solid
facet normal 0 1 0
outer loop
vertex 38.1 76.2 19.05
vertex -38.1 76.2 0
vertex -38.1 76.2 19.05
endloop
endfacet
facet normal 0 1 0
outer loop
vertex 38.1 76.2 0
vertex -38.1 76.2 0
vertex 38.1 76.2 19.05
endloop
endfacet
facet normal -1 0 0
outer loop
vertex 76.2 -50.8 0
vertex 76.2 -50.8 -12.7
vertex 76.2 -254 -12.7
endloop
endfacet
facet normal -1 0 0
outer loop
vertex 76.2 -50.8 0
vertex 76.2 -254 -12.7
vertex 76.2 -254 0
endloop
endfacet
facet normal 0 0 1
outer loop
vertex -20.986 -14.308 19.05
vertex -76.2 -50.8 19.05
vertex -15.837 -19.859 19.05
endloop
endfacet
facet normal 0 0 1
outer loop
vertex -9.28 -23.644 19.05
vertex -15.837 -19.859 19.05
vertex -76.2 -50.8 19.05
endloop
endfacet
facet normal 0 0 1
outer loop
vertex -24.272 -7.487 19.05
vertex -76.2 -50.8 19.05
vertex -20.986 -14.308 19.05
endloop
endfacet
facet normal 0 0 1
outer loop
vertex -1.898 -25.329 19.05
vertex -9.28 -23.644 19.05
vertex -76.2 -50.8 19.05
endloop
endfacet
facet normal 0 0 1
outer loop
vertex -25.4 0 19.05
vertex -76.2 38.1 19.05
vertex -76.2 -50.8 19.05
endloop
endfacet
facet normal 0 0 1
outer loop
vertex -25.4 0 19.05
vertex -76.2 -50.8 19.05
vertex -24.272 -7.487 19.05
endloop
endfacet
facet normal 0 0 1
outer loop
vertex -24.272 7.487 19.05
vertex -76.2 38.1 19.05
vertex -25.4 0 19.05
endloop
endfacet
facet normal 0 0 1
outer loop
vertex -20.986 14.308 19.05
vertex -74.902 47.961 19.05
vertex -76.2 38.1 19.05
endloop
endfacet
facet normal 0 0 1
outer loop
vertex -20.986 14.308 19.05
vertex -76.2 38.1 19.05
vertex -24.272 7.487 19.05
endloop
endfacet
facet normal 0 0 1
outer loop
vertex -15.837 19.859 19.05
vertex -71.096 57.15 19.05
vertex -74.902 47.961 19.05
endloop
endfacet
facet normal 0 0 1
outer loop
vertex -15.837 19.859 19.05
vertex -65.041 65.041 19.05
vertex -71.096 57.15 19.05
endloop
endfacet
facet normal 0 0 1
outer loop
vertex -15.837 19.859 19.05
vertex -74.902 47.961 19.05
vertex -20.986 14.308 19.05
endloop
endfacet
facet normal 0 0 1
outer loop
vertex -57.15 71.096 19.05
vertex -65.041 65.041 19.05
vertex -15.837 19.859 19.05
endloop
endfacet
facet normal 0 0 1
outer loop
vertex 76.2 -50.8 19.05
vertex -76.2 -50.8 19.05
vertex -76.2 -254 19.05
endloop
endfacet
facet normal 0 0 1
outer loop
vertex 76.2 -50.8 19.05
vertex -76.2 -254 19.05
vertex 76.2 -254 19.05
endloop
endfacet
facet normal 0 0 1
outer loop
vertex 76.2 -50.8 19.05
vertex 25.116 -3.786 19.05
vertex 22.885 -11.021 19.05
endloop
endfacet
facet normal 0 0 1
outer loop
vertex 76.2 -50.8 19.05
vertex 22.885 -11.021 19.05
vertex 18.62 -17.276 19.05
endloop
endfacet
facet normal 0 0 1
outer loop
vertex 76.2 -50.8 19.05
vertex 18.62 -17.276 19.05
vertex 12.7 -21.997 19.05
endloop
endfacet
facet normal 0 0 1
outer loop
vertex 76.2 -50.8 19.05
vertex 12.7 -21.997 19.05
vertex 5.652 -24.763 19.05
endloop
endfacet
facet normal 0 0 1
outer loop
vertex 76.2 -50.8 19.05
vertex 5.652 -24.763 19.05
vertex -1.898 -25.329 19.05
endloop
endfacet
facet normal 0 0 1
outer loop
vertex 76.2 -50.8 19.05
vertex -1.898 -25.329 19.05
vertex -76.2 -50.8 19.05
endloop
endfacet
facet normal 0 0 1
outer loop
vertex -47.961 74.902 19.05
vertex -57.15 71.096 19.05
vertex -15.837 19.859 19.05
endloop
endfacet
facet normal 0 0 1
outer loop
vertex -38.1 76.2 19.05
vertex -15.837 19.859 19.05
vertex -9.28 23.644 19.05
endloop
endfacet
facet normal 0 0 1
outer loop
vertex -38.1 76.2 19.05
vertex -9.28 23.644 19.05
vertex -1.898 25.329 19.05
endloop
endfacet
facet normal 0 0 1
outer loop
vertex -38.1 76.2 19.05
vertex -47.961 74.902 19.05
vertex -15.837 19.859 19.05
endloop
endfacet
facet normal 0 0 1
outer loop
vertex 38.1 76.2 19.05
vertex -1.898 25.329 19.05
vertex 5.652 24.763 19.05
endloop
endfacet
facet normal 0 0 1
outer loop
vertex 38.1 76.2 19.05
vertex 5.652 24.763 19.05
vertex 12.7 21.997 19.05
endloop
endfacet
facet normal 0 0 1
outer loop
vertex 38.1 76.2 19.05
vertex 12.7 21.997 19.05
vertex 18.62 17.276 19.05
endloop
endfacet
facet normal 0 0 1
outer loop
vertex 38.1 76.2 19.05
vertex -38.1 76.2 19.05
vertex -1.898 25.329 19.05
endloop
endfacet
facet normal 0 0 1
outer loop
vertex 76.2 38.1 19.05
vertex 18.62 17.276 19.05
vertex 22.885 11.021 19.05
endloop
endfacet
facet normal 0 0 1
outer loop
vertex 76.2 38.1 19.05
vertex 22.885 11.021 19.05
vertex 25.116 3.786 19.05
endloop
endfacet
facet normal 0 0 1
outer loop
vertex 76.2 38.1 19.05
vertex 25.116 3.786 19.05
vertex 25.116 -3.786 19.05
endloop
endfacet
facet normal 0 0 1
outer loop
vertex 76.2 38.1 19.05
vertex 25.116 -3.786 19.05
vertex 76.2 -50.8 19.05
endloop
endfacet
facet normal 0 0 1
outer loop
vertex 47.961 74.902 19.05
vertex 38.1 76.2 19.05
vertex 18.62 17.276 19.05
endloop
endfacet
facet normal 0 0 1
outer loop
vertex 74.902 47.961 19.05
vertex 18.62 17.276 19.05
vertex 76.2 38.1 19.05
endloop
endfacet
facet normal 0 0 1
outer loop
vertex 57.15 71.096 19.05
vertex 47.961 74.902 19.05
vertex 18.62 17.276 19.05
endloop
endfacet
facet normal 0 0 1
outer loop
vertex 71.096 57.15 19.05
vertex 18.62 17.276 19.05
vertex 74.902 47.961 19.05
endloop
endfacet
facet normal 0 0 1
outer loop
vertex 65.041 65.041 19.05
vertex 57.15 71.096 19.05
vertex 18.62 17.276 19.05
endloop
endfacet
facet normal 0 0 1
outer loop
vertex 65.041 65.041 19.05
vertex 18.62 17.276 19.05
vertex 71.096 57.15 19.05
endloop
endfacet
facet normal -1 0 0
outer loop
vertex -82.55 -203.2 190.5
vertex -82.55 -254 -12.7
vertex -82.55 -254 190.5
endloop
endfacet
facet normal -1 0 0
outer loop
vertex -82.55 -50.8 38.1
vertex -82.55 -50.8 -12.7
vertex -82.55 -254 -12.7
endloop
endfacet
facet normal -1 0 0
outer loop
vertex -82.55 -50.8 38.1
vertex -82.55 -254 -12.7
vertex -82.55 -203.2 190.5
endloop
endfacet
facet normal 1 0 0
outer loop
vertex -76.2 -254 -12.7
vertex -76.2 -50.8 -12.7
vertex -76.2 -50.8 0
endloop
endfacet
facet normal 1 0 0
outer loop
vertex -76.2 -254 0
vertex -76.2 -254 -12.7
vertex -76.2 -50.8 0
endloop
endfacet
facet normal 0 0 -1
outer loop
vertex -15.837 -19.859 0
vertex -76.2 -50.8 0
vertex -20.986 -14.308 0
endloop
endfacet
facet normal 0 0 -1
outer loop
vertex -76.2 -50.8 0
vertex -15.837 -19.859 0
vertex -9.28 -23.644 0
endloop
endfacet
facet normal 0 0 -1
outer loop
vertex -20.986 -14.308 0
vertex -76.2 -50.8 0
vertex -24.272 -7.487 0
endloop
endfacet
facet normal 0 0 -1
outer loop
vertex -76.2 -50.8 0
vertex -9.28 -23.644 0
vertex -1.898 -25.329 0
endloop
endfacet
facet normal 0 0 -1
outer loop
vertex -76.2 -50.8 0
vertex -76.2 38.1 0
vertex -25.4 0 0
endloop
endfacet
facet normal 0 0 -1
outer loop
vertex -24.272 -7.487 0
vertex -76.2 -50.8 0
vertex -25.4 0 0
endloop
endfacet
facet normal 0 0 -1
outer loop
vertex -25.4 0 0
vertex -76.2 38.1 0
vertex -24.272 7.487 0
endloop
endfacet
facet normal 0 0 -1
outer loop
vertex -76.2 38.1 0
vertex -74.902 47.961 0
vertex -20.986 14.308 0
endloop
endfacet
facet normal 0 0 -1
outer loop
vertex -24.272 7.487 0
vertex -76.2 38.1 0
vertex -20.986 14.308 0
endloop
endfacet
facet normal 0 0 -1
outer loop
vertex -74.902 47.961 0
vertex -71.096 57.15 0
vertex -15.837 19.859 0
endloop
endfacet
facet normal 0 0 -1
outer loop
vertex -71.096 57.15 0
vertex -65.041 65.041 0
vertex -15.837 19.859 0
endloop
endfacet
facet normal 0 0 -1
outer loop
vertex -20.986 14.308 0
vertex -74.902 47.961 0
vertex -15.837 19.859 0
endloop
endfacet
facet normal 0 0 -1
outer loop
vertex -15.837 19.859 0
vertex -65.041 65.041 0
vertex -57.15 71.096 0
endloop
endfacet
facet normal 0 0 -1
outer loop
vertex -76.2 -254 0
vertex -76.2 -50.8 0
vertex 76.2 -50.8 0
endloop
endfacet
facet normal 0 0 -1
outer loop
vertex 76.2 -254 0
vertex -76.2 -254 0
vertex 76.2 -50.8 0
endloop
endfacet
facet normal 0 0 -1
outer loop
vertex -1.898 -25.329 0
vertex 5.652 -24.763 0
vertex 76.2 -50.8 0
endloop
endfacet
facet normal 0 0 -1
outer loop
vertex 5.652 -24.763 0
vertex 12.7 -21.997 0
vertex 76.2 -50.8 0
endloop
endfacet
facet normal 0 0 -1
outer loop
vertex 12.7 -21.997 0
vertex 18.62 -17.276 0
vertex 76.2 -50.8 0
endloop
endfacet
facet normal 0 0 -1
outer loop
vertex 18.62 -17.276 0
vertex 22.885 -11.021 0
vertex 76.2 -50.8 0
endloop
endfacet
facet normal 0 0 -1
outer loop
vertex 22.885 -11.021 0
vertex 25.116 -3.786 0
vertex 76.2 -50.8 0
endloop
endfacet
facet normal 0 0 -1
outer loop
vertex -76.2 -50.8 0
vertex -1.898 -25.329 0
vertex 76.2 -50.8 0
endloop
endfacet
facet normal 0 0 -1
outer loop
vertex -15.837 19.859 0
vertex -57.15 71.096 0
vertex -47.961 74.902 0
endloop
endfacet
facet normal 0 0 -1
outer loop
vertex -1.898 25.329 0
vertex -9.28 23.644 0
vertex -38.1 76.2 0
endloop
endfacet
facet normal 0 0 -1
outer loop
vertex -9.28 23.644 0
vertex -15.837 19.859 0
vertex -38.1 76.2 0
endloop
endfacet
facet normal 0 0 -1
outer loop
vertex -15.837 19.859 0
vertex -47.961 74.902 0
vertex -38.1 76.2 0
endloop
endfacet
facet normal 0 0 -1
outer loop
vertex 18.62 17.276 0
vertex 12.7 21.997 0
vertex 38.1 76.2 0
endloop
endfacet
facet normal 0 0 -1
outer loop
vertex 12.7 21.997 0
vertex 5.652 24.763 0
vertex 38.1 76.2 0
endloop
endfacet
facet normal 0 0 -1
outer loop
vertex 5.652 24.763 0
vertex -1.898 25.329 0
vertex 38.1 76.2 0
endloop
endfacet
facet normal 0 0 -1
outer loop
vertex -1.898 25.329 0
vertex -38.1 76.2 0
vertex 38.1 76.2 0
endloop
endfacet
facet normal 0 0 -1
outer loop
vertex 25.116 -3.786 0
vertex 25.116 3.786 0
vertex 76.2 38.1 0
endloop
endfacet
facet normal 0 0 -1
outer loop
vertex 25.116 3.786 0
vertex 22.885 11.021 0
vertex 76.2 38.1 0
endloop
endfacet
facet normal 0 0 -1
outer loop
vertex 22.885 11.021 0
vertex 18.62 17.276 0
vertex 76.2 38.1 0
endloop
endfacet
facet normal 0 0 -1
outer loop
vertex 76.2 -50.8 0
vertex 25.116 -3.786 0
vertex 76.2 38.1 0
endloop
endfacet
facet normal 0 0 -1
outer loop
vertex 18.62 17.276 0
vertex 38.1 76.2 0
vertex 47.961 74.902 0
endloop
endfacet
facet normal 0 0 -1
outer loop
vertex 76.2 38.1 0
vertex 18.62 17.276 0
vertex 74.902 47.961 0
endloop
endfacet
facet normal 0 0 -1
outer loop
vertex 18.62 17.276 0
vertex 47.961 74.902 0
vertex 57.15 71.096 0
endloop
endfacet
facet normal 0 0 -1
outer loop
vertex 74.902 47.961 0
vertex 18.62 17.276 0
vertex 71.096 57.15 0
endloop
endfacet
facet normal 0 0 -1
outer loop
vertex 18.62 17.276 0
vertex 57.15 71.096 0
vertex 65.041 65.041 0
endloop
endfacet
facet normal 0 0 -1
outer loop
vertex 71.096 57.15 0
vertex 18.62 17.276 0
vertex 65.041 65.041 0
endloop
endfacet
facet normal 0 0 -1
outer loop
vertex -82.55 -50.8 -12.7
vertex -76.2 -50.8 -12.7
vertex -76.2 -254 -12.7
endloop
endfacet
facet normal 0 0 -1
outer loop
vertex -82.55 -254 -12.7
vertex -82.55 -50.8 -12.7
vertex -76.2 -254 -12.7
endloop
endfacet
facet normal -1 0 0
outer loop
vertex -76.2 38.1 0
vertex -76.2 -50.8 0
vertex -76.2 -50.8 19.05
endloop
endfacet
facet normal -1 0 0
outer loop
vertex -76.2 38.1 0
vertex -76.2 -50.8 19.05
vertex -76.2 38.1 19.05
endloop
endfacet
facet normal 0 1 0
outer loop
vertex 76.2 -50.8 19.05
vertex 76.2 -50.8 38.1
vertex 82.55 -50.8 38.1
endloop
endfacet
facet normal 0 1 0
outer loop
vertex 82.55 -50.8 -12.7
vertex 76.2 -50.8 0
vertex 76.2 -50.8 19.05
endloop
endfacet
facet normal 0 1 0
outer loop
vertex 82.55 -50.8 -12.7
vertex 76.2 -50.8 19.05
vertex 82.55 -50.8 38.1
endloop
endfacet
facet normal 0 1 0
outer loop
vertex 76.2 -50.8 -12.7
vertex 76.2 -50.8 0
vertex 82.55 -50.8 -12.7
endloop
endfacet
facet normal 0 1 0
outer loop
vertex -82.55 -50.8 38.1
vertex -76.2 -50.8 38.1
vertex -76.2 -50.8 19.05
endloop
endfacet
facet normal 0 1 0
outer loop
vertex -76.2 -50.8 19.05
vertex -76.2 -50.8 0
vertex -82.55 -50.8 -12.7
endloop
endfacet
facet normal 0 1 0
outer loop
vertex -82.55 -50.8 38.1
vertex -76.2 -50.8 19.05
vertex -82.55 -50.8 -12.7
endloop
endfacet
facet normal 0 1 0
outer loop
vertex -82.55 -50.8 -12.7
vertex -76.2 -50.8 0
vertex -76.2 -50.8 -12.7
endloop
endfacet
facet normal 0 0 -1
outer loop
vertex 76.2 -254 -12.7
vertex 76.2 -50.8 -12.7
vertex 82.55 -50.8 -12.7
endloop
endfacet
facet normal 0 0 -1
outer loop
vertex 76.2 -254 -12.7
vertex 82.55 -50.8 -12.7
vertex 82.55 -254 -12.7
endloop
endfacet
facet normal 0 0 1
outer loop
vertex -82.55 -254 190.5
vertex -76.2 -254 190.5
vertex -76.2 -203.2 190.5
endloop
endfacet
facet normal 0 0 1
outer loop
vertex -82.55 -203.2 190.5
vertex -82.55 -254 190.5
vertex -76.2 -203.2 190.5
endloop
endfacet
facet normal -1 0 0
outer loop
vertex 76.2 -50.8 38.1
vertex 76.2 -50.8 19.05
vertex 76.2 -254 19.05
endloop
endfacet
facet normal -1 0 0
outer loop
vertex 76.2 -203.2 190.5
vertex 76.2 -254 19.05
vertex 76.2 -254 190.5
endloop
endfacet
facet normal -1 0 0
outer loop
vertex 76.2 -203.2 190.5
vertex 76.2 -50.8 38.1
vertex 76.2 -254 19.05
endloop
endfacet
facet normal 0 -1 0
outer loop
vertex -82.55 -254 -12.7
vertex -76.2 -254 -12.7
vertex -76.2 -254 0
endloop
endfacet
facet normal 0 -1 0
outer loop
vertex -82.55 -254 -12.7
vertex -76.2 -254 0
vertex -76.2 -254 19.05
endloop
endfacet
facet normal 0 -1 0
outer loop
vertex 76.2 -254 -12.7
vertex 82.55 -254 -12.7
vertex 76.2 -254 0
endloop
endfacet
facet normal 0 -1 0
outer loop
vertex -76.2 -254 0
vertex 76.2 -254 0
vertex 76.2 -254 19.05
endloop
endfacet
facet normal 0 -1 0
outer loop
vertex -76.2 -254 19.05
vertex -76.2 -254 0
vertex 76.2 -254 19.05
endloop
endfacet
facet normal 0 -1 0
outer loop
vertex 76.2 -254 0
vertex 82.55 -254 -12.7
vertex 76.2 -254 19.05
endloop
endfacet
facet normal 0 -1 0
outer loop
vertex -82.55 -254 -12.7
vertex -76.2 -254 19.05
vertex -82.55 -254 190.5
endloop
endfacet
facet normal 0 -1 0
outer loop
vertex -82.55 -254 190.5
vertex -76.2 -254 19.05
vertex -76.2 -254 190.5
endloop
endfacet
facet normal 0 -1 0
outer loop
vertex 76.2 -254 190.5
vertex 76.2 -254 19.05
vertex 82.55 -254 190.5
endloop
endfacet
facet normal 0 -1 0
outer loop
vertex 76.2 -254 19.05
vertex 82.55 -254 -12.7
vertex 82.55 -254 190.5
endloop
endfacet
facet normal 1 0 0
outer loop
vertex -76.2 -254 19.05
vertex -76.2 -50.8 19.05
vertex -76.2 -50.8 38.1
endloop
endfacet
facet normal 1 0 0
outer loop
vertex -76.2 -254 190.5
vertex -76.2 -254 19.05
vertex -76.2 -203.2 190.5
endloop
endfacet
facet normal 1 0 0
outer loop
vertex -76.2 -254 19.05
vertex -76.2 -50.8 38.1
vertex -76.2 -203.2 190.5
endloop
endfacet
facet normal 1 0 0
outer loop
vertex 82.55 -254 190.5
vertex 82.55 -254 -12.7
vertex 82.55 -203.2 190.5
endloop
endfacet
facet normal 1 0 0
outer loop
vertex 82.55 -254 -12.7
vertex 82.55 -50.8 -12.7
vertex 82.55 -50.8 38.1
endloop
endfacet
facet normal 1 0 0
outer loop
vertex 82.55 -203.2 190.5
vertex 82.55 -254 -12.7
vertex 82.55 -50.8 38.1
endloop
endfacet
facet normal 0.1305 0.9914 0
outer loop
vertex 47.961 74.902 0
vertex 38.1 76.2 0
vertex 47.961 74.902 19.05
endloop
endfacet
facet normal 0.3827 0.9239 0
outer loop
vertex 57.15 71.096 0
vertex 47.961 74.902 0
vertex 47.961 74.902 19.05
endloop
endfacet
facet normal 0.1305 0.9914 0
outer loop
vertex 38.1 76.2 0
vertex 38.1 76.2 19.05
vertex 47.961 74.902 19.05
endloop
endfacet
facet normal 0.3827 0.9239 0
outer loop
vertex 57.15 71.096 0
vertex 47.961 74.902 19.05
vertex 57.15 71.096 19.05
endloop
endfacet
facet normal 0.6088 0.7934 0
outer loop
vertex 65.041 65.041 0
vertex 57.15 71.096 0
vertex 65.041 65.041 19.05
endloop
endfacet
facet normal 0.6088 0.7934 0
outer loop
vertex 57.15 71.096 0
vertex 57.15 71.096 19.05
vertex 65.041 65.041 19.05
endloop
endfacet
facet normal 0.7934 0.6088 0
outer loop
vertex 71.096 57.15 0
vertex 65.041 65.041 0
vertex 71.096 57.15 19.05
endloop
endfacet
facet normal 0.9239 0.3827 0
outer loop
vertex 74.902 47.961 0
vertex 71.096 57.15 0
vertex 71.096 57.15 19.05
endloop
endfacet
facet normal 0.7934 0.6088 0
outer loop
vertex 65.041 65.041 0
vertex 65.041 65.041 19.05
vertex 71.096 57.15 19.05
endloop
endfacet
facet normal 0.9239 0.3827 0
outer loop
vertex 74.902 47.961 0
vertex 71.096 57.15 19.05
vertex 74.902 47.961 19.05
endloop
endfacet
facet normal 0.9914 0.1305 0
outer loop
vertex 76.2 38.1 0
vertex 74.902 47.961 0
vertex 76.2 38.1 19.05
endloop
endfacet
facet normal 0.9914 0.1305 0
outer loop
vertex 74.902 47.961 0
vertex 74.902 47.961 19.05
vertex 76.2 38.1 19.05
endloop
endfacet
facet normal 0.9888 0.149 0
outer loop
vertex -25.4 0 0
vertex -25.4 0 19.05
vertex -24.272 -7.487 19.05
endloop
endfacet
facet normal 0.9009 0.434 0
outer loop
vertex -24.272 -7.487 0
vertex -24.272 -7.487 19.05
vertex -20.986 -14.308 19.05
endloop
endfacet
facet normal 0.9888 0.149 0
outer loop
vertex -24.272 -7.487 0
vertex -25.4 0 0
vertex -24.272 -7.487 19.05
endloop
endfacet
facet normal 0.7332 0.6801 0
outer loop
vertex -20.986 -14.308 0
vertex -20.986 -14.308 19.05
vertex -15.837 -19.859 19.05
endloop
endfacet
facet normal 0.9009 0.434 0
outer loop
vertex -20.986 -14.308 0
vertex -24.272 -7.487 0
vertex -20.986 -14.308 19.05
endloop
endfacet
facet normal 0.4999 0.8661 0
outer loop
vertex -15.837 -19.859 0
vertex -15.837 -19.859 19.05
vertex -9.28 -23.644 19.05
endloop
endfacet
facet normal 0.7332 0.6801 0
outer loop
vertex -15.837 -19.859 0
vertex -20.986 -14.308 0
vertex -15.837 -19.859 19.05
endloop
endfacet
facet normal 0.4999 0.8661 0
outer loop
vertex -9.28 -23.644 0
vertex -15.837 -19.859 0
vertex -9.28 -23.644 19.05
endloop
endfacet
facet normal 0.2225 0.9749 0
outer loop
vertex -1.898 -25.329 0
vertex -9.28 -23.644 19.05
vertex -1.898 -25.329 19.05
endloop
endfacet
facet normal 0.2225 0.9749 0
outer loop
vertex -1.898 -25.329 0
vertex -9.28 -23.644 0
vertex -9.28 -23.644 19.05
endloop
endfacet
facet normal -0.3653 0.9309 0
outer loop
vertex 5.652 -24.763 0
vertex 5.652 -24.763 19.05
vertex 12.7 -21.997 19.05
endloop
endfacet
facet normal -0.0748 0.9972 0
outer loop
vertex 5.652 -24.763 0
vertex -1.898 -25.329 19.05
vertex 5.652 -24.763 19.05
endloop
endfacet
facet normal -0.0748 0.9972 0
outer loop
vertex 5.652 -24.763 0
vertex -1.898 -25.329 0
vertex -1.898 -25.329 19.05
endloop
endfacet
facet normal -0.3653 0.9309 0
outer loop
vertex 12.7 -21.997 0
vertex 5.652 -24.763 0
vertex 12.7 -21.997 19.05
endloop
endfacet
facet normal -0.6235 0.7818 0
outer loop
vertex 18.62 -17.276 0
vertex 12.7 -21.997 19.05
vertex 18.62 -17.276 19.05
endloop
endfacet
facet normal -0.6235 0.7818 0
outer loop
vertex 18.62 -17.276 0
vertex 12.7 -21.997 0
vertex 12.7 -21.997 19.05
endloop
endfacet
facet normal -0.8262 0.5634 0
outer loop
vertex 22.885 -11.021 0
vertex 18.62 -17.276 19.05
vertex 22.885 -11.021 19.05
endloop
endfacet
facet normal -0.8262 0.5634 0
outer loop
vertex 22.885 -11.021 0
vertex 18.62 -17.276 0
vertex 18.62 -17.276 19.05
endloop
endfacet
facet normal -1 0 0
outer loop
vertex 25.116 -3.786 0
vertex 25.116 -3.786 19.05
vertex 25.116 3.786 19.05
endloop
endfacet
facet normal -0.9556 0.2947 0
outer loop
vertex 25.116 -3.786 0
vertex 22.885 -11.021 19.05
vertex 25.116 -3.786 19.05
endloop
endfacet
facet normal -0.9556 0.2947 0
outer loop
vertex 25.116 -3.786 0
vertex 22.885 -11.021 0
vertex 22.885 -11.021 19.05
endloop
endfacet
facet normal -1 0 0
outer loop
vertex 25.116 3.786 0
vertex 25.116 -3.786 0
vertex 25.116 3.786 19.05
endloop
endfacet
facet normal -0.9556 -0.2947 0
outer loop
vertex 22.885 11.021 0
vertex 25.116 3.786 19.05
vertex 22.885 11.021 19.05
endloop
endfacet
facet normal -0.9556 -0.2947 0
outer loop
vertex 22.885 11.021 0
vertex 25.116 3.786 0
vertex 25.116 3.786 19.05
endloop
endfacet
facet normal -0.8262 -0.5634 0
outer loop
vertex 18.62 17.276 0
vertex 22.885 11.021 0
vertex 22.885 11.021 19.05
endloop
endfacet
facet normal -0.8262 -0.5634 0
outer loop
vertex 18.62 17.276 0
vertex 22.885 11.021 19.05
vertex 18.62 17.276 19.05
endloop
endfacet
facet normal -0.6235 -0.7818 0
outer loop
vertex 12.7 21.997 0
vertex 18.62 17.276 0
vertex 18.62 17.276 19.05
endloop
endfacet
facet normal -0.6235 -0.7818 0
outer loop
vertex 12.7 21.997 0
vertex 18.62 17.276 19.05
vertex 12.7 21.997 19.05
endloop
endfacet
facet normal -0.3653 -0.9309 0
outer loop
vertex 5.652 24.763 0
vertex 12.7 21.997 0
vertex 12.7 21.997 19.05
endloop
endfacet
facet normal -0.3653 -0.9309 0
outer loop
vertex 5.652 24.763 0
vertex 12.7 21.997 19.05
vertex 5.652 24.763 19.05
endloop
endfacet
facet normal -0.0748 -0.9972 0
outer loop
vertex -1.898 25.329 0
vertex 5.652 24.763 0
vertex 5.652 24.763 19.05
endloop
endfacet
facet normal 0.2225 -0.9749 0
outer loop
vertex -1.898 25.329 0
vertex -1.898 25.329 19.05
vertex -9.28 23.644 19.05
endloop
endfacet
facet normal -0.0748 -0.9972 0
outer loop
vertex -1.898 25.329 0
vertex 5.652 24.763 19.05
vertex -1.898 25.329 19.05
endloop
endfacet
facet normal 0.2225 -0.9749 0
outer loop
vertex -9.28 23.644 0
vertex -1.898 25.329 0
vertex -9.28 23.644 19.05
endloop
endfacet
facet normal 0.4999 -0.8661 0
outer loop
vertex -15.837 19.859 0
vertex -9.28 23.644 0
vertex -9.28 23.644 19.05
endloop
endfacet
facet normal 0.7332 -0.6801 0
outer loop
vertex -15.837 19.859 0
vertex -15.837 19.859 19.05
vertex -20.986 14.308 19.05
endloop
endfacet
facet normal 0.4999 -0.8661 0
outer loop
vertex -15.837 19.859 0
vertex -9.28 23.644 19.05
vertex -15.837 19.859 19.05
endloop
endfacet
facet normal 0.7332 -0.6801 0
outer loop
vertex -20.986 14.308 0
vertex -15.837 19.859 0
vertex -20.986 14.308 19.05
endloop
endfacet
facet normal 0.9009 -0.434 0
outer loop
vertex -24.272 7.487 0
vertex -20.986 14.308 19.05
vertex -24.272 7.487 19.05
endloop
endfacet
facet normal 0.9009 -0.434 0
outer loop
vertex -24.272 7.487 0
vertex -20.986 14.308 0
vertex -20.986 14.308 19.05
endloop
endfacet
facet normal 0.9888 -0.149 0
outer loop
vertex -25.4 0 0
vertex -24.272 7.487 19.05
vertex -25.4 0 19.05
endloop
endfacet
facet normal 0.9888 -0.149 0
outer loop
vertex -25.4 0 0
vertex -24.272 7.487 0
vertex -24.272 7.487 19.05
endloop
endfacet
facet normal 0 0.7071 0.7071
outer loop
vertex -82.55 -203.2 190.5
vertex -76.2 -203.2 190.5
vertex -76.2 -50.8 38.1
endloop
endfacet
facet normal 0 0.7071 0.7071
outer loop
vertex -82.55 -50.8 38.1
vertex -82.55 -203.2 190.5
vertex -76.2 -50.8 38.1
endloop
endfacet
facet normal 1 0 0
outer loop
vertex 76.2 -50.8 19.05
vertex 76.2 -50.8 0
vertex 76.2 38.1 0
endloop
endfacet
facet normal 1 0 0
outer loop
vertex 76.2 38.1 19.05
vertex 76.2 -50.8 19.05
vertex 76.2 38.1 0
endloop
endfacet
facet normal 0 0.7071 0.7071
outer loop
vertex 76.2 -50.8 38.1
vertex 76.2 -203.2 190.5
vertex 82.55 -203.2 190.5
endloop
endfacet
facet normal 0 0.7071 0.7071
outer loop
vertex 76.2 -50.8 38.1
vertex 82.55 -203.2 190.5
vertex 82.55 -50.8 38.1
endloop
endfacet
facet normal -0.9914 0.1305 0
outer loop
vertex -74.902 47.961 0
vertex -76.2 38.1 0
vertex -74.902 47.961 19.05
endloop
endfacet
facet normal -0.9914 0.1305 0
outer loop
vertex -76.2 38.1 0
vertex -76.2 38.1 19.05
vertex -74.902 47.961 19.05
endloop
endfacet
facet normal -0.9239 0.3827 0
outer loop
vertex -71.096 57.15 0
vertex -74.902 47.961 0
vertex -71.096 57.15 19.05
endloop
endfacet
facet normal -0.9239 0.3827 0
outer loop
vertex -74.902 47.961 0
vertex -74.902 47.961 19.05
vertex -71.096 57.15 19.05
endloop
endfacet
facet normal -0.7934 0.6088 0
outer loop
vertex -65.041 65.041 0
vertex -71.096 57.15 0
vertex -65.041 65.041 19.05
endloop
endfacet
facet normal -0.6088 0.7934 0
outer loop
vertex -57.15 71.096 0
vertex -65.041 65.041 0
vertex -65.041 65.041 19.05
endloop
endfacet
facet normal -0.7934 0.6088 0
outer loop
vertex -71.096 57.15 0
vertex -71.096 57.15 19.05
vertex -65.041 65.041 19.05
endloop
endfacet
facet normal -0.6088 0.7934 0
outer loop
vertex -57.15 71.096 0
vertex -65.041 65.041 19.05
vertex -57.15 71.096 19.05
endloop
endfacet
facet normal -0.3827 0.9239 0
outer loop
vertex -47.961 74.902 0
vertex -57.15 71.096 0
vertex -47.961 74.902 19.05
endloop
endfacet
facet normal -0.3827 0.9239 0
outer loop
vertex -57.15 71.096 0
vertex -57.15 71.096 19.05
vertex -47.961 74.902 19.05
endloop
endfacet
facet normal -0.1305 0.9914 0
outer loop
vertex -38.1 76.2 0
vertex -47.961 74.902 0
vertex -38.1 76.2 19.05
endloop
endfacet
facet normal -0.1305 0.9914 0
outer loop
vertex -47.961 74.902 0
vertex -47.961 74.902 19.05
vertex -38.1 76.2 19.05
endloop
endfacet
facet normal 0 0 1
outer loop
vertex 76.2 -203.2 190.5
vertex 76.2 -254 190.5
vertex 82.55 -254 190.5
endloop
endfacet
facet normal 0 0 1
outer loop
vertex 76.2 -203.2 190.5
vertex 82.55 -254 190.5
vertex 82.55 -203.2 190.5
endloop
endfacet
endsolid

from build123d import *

# Parameters (mm, degrees)
SKETCH2_W           = 152.4
SKETCH2_H           = 330.2
BOSS_EXTRUDE1_DEPTH = 19.05
SKETCH5_R           = 25.4
CUT_EXTRUDE1_DEPTH  = 266.867151976
FILLET1_R           = 38.1
BOSS_EXTRUDE2_DEPTH = 6.35


with BuildPart() as part:
    # Sketch2 → Boss-Extrude1 (new body)
    with BuildSketch(Plane.XY):
        with Locations((0, -88.9)):
            Rectangle(SKETCH2_W, SKETCH2_H)
    extrude(amount=BOSS_EXTRUDE1_DEPTH)

    # Sketch5 → Cut-Extrude1 (cut, through all)
    with BuildSketch(Plane.XY):
        with Locations(Location((0, 0, 0), (0, 0, 180))):
            Circle(SKETCH5_R)
    extrude(amount=CUT_EXTRUDE1_DEPTH, mode=Mode.SUBTRACT)

    # Fillet1
    fillet1_edges = [part.edges().sort_by_distance(p)[0] for p in [
        (-76.2, 76.2, 9.525),
        (76.2, 76.2, 9.525),
    ]]
    fillet(fillet1_edges, radius=FILLET1_R)

    # Sketch3 → Boss-Extrude2 (add)
    with BuildSketch(Plane(origin=(76.2, 0, 0), x_dir=(0, 0, -1), z_dir=(1, 0, 0))):
        Polygon((12.7, -50.8), (12.7, -254), (-190.5, -254), (-190.5, -203.2), (-38.1, -50.8), align=None)
    boss_extrude2 = extrude(amount=BOSS_EXTRUDE2_DEPTH)

    # Mirror1: Boss-Extrude2 across plane
    add(boss_extrude2.mirror(Plane(origin=(0, 0, 0), x_dir=(0, 0, 1), z_dir=(1, 0, 0))))


solid = part.part
